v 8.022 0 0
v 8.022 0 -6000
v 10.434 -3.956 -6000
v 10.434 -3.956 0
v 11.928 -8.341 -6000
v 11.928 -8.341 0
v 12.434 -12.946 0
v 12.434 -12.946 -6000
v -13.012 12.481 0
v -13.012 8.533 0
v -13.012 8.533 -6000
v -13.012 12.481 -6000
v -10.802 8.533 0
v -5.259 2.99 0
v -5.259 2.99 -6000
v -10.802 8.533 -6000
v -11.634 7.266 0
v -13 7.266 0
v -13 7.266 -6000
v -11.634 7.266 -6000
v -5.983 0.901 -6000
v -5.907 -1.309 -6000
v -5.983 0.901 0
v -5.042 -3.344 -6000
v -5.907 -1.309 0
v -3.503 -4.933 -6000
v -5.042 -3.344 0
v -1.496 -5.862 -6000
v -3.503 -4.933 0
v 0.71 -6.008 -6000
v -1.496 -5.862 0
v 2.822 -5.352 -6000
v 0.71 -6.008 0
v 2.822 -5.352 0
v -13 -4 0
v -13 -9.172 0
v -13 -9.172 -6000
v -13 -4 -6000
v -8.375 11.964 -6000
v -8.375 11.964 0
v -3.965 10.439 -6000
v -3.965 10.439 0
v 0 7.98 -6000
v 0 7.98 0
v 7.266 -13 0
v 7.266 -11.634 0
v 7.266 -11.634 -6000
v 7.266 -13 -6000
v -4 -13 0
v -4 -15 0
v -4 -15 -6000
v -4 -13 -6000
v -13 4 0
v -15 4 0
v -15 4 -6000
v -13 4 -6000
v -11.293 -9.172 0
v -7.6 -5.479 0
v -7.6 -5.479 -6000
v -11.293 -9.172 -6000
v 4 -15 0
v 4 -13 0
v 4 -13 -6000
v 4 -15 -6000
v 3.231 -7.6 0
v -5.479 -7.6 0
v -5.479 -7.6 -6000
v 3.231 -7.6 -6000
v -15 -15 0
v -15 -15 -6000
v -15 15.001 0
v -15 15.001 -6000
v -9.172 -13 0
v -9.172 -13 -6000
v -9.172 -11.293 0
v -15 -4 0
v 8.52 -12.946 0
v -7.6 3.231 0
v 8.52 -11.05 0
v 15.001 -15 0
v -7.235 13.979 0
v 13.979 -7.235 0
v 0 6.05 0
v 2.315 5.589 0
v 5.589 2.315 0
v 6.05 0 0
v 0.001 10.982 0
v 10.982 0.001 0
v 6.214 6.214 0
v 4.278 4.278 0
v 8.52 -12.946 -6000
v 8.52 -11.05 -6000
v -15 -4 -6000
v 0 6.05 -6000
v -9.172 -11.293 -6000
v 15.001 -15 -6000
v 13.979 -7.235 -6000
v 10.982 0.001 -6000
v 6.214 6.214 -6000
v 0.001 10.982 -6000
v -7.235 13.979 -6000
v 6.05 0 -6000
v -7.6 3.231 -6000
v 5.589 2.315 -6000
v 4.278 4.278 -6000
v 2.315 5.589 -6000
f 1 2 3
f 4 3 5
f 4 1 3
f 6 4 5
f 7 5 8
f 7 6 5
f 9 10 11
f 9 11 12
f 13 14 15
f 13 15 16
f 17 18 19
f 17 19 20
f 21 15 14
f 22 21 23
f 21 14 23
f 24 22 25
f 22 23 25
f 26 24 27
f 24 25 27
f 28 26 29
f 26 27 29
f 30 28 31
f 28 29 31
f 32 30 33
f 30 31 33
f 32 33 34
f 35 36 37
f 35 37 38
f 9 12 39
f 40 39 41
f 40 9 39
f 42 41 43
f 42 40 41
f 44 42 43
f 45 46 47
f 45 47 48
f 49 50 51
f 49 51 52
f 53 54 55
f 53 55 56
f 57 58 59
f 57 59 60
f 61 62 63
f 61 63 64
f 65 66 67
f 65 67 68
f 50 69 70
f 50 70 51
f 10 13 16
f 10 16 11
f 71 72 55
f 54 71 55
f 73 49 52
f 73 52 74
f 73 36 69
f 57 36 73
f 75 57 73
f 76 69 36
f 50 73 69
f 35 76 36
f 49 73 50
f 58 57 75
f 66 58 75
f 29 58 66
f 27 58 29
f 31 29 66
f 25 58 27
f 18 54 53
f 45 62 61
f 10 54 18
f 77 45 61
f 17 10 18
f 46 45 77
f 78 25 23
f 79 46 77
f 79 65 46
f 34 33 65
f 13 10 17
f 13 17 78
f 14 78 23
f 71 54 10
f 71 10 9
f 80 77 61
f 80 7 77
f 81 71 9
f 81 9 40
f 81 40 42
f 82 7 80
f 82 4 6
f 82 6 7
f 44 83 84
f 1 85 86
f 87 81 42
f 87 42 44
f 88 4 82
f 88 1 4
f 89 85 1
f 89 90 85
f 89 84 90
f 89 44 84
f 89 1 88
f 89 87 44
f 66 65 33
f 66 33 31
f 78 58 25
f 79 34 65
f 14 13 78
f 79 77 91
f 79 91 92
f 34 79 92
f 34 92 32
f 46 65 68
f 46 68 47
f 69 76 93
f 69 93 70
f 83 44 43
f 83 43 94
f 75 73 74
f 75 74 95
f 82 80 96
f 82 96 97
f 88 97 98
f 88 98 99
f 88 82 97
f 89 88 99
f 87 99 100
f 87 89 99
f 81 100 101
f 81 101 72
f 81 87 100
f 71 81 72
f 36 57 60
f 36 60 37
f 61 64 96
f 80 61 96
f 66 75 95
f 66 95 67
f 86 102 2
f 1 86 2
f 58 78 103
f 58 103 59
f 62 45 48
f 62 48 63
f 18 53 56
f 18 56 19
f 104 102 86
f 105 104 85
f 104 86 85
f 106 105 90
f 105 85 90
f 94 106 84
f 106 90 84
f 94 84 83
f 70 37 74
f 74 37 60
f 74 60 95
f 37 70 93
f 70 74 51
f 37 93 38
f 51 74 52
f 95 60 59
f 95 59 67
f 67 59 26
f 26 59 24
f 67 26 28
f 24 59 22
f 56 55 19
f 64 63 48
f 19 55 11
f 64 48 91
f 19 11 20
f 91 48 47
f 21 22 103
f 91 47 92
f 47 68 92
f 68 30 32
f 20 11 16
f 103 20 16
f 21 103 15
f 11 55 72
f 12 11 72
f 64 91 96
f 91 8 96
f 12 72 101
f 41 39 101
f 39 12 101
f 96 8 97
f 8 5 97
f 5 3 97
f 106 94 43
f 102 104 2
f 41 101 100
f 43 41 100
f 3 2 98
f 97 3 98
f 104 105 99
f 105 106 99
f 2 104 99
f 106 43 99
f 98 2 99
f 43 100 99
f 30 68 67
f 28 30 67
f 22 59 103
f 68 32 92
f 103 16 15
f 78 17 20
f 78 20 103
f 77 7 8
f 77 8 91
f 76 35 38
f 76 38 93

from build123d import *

# Parameters (mm, degrees)
SKETCH1_R          = 6.05
EXTRUDE1_DEPTH     = 6000
CUT_EXTRUDE1_DEPTH = 6001


with BuildPart() as part:
    # Sketch1 → Extrude1 (new body)
    with BuildSketch(Plane.XY):
        with BuildLine():
            Line((-11.292893, -9.171573), (-13, -9.171573))
            Line((-13, -9.171573), (-13, -4))
            Line((-13, -4), (-15, -4))
            Line((-15, -4), (-15, -15))
            Line((-15, -15), (-3.999999934, -15))
            Line((-3.999999934, -15), (-3.999999934, -13))
            Line((-3.999999934, -13), (-9.171572934, -13))
            Line((-9.171572934, -13), (-9.171572934, -11.292893))
            Line((-9.171572934, -11.292893), (-5.478679934, -7.6))
            Line((-5.478679934, -7.6), (3.231371323, -7.6))
            Line((3.231371323, -7.6), (7.265685066, -11.634315))
            Line((7.265685066, -11.634315), (7.265685066, -13))
            Line((7.265685066, -13), (4.000000066, -13))
            Line((4.000000066, -13), (4.000000066, -15))
            Line((4.000000066, -15), (15.001499931, -15))
            ThreePointArc((15.001499931, -15), (6.214264035, 6.214264026), (-15, 15.001499898))
            Line((-15, 15.001499898), (-15, 4))
            Line((-15, 4), (-13, 4))
            Line((-13, 4), (-13, 7.265685))
            Line((-13, 7.265685), (-11.634315, 7.265685))
            Line((-11.634315, 7.265685), (-7.6, 3.231371278))
            Line((-7.6, 3.231371278), (-7.6, -5.47868))
            Line((-7.6, -5.47868), (-11.292893, -9.171573))
        make_face()
        Circle(SKETCH1_R, mode=Mode.SUBTRACT)
    extrude(amount=-EXTRUDE1_DEPTH)

    # Sketch2 → Cut-Extrude1 (cut, through all)
    with BuildSketch(Plane.XY):
        with BuildLine():
            Line((6.05, 0), (8.022374154, 0))
            ThreePointArc((8.022374154, 0), (11.301094724, -6.107256592), (12.434393171, -12.945694008))
            Line((12.434393171, -12.945694008), (8.519597612, -12.945694008))
            Line((8.519597612, -12.945694008), (8.519597612, -11.049532451))
            Line((8.519597612, -11.049532451), (2.821731423, -5.351666262))
            ThreePointArc((2.821731423, -5.351666262), (-4.345433196, -4.20947863), (-5.259300556, 2.990360792))
            Line((-5.259300556, 2.990360792), (-10.801843855, 8.532904091))
            Line((-10.801843855, 8.532904091), (-13.012013608, 8.532904091))
            Line((-13.012013608, 8.532904091), (-13.012013608, 12.481450922))
            ThreePointArc((-13.012013608, 12.481450922), (-6.127642695, 11.324212583), (0, 7.979700895))
            Line((0, 7.979700895), (0, 6.05))
            ThreePointArc((0, 6.05), (4.277996026, 4.277996026), (6.05, 0))
        make_face()
    extrude(amount=-CUT_EXTRUDE1_DEPTH, mode=Mode.SUBTRACT)


solid = part.part
